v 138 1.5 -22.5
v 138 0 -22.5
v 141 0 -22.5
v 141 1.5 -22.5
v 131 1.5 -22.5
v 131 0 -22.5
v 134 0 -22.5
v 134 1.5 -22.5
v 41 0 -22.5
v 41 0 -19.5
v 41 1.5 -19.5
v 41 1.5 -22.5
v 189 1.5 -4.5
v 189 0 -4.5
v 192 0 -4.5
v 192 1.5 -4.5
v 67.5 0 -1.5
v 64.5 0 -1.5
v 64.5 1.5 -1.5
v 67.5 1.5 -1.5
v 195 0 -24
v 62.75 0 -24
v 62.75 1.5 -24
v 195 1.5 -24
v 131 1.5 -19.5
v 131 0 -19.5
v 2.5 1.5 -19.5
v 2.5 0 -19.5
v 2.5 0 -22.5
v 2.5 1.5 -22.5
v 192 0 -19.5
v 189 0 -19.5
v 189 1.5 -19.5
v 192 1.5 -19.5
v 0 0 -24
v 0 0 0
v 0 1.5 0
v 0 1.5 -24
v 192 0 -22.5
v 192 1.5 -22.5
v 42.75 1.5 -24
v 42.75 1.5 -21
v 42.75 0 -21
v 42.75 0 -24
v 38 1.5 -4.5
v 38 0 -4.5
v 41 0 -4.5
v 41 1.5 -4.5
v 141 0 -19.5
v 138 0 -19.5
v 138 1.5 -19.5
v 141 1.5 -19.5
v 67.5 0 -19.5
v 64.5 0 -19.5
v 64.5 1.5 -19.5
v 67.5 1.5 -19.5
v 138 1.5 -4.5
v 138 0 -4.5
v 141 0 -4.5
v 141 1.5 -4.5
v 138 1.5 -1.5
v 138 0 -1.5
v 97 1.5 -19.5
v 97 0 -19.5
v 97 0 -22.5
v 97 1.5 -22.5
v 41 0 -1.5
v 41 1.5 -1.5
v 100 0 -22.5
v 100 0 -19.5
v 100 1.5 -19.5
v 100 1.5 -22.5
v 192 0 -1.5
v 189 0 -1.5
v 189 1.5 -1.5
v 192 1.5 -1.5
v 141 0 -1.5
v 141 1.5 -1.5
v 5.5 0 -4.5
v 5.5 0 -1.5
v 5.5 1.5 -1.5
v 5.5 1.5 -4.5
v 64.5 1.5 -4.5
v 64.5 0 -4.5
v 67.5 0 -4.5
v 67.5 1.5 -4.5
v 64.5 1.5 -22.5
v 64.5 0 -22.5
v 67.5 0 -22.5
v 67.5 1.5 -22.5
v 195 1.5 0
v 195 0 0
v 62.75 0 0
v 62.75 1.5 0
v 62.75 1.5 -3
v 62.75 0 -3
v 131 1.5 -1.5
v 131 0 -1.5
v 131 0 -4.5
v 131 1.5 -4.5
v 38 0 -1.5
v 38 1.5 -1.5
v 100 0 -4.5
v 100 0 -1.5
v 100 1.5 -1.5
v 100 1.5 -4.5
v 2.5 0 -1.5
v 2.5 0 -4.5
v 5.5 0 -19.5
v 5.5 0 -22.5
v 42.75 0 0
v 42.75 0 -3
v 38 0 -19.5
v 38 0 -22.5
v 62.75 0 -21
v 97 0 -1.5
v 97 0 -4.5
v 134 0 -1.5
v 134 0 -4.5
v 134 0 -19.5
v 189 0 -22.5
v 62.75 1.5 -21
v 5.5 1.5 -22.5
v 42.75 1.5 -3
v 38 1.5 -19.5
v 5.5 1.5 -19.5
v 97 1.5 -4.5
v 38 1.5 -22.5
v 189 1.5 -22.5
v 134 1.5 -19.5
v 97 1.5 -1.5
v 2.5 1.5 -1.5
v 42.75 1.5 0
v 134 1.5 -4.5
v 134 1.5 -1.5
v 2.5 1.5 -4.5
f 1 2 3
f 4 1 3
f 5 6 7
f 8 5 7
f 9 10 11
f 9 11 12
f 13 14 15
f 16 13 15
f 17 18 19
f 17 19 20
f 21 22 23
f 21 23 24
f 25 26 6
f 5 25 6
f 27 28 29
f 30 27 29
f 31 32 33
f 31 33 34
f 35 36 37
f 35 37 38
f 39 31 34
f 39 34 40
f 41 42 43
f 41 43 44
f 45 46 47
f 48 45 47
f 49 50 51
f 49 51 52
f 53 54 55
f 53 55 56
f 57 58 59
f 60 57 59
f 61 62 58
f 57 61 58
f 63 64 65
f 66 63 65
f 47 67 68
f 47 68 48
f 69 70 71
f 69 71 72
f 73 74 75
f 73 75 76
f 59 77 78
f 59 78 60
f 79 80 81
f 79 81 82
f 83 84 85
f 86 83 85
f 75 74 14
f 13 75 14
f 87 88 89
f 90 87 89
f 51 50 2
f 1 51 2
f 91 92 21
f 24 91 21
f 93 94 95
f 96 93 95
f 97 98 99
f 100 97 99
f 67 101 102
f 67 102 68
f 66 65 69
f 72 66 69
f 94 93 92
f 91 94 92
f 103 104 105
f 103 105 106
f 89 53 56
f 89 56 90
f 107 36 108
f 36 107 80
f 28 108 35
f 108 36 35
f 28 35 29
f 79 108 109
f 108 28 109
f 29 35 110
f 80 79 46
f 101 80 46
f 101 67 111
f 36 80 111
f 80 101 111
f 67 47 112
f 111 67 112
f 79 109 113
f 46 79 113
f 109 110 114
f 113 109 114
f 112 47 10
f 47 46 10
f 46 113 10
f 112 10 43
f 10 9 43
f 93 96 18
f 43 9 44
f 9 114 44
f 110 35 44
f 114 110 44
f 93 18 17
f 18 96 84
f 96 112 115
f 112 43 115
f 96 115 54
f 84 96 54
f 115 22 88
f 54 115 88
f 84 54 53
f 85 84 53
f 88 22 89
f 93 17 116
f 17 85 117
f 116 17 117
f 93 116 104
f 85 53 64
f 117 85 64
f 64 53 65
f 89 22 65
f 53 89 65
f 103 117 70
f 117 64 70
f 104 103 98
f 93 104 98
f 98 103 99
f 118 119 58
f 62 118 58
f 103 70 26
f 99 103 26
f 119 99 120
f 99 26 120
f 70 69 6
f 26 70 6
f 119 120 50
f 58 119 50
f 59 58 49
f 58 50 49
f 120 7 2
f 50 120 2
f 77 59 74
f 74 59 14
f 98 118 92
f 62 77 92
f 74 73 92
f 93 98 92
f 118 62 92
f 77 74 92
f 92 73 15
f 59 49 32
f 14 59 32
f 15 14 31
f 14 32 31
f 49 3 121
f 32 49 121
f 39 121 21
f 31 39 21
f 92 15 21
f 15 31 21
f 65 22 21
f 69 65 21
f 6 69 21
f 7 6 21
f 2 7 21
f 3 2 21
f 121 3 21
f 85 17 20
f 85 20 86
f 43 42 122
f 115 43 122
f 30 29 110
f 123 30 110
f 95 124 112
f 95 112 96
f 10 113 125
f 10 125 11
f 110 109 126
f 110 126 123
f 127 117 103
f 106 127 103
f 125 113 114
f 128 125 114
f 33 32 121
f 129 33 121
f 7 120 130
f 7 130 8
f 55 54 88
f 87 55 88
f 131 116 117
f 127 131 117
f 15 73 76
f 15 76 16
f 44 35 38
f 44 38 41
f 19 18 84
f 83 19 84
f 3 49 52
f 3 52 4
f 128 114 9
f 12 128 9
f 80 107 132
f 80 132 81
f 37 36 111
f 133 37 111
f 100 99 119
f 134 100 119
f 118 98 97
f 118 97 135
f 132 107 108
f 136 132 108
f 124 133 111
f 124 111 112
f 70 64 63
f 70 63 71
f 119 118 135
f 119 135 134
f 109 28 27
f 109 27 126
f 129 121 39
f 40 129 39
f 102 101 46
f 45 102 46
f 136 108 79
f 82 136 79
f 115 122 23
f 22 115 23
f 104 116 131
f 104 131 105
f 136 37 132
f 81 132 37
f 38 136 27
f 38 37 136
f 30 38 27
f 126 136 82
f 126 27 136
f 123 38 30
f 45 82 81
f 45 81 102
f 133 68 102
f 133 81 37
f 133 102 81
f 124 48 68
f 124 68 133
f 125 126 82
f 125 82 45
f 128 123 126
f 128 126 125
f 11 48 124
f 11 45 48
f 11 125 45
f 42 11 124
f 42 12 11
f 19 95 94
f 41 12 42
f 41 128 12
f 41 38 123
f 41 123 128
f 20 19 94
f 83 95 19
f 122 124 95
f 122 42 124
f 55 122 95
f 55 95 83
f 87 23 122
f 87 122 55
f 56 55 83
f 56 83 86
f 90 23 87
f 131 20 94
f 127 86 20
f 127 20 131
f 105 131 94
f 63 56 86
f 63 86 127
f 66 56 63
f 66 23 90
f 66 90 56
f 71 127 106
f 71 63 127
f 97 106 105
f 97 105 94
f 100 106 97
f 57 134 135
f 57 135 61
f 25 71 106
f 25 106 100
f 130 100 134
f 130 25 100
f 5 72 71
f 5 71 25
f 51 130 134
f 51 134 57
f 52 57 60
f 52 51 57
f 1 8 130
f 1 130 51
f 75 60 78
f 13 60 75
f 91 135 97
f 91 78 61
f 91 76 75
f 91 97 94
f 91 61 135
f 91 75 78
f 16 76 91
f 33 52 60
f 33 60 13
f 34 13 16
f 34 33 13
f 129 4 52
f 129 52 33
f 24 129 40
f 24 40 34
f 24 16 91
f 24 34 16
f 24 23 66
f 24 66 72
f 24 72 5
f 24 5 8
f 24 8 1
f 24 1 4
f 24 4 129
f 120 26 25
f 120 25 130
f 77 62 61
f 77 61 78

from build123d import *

# Parameters (mm, degrees)
SKETCH1_W           = 195
SKETCH1_H           = 24
SKETCH1_W_2         = 3
SKETCH1_H_2         = 3
BOSS_EXTRUDE1_DEPTH = 1.5
SKETCH2_W           = 20
SKETCH2_H           = 3
CUT_EXTRUDE1_DEPTH  = 1.5


with BuildPart() as part:
    # Sketch1 → Boss-Extrude1 (new body)
    with BuildSketch(Plane(origin=(0, 0, 0), x_dir=(1, 0, 0), z_dir=(0, 1, 0))):
        with Locations((97.5, 12)):
            Rectangle(SKETCH1_W, SKETCH1_H)
        with Locations((66, 3)):
            Rectangle(SKETCH1_W_2, SKETCH1_H_2, mode=Mode.SUBTRACT)
        with Locations((4, 21)):
            Rectangle(SKETCH1_W_2, SKETCH1_H_2, mode=Mode.SUBTRACT)
        with Locations((39.5, 3)):
            Rectangle(SKETCH1_W_2, SKETCH1_H_2, mode=Mode.SUBTRACT)
        with Locations((98.5, 3)):
            Rectangle(SKETCH1_W_2, SKETCH1_H_2, mode=Mode.SUBTRACT)
        with Locations((139.5, 3)):
            Rectangle(SKETCH1_W_2, SKETCH1_H_2, mode=Mode.SUBTRACT)
        with Locations((139.5, 21)):
            Rectangle(SKETCH1_W_2, SKETCH1_H_2, mode=Mode.SUBTRACT)
        with Locations((132.5, 3)):
            Rectangle(SKETCH1_W_2, SKETCH1_H_2, mode=Mode.SUBTRACT)
        with Locations((132.5, 21)):
            Rectangle(SKETCH1_W_2, SKETCH1_H_2, mode=Mode.SUBTRACT)
        with Locations((66, 21)):
            Rectangle(SKETCH1_W_2, SKETCH1_H_2, mode=Mode.SUBTRACT)
        with Locations((98.5, 21)):
            Rectangle(SKETCH1_W_2, SKETCH1_H_2, mode=Mode.SUBTRACT)
        with Locations((39.5, 21)):
            Rectangle(SKETCH1_W_2, SKETCH1_H_2, mode=Mode.SUBTRACT)
        with Locations((4, 3)):
            Rectangle(SKETCH1_W_2, SKETCH1_H_2, mode=Mode.SUBTRACT)
        with Locations((190.5, 21)):
            Rectangle(SKETCH1_W_2, SKETCH1_H_2, mode=Mode.SUBTRACT)
        with Locations((190.5, 3)):
            Rectangle(SKETCH1_W_2, SKETCH1_H_2, mode=Mode.SUBTRACT)
    extrude(amount=BOSS_EXTRUDE1_DEPTH)

    # Sketch2 → Cut-Extrude1 (cut)
    with BuildSketch(Plane(origin=(0, 1.5, 0), x_dir=(1, 0, 0), z_dir=(0, 1, 0))):
        with Locations((52.75, 1.5)):
            Rectangle(SKETCH2_W, SKETCH2_H)
        with Locations((52.75, 22.5)):
            Rectangle(SKETCH2_W, SKETCH2_H)
    extrude(amount=-CUT_EXTRUDE1_DEPTH, mode=Mode.SUBTRACT)


solid = part.part
